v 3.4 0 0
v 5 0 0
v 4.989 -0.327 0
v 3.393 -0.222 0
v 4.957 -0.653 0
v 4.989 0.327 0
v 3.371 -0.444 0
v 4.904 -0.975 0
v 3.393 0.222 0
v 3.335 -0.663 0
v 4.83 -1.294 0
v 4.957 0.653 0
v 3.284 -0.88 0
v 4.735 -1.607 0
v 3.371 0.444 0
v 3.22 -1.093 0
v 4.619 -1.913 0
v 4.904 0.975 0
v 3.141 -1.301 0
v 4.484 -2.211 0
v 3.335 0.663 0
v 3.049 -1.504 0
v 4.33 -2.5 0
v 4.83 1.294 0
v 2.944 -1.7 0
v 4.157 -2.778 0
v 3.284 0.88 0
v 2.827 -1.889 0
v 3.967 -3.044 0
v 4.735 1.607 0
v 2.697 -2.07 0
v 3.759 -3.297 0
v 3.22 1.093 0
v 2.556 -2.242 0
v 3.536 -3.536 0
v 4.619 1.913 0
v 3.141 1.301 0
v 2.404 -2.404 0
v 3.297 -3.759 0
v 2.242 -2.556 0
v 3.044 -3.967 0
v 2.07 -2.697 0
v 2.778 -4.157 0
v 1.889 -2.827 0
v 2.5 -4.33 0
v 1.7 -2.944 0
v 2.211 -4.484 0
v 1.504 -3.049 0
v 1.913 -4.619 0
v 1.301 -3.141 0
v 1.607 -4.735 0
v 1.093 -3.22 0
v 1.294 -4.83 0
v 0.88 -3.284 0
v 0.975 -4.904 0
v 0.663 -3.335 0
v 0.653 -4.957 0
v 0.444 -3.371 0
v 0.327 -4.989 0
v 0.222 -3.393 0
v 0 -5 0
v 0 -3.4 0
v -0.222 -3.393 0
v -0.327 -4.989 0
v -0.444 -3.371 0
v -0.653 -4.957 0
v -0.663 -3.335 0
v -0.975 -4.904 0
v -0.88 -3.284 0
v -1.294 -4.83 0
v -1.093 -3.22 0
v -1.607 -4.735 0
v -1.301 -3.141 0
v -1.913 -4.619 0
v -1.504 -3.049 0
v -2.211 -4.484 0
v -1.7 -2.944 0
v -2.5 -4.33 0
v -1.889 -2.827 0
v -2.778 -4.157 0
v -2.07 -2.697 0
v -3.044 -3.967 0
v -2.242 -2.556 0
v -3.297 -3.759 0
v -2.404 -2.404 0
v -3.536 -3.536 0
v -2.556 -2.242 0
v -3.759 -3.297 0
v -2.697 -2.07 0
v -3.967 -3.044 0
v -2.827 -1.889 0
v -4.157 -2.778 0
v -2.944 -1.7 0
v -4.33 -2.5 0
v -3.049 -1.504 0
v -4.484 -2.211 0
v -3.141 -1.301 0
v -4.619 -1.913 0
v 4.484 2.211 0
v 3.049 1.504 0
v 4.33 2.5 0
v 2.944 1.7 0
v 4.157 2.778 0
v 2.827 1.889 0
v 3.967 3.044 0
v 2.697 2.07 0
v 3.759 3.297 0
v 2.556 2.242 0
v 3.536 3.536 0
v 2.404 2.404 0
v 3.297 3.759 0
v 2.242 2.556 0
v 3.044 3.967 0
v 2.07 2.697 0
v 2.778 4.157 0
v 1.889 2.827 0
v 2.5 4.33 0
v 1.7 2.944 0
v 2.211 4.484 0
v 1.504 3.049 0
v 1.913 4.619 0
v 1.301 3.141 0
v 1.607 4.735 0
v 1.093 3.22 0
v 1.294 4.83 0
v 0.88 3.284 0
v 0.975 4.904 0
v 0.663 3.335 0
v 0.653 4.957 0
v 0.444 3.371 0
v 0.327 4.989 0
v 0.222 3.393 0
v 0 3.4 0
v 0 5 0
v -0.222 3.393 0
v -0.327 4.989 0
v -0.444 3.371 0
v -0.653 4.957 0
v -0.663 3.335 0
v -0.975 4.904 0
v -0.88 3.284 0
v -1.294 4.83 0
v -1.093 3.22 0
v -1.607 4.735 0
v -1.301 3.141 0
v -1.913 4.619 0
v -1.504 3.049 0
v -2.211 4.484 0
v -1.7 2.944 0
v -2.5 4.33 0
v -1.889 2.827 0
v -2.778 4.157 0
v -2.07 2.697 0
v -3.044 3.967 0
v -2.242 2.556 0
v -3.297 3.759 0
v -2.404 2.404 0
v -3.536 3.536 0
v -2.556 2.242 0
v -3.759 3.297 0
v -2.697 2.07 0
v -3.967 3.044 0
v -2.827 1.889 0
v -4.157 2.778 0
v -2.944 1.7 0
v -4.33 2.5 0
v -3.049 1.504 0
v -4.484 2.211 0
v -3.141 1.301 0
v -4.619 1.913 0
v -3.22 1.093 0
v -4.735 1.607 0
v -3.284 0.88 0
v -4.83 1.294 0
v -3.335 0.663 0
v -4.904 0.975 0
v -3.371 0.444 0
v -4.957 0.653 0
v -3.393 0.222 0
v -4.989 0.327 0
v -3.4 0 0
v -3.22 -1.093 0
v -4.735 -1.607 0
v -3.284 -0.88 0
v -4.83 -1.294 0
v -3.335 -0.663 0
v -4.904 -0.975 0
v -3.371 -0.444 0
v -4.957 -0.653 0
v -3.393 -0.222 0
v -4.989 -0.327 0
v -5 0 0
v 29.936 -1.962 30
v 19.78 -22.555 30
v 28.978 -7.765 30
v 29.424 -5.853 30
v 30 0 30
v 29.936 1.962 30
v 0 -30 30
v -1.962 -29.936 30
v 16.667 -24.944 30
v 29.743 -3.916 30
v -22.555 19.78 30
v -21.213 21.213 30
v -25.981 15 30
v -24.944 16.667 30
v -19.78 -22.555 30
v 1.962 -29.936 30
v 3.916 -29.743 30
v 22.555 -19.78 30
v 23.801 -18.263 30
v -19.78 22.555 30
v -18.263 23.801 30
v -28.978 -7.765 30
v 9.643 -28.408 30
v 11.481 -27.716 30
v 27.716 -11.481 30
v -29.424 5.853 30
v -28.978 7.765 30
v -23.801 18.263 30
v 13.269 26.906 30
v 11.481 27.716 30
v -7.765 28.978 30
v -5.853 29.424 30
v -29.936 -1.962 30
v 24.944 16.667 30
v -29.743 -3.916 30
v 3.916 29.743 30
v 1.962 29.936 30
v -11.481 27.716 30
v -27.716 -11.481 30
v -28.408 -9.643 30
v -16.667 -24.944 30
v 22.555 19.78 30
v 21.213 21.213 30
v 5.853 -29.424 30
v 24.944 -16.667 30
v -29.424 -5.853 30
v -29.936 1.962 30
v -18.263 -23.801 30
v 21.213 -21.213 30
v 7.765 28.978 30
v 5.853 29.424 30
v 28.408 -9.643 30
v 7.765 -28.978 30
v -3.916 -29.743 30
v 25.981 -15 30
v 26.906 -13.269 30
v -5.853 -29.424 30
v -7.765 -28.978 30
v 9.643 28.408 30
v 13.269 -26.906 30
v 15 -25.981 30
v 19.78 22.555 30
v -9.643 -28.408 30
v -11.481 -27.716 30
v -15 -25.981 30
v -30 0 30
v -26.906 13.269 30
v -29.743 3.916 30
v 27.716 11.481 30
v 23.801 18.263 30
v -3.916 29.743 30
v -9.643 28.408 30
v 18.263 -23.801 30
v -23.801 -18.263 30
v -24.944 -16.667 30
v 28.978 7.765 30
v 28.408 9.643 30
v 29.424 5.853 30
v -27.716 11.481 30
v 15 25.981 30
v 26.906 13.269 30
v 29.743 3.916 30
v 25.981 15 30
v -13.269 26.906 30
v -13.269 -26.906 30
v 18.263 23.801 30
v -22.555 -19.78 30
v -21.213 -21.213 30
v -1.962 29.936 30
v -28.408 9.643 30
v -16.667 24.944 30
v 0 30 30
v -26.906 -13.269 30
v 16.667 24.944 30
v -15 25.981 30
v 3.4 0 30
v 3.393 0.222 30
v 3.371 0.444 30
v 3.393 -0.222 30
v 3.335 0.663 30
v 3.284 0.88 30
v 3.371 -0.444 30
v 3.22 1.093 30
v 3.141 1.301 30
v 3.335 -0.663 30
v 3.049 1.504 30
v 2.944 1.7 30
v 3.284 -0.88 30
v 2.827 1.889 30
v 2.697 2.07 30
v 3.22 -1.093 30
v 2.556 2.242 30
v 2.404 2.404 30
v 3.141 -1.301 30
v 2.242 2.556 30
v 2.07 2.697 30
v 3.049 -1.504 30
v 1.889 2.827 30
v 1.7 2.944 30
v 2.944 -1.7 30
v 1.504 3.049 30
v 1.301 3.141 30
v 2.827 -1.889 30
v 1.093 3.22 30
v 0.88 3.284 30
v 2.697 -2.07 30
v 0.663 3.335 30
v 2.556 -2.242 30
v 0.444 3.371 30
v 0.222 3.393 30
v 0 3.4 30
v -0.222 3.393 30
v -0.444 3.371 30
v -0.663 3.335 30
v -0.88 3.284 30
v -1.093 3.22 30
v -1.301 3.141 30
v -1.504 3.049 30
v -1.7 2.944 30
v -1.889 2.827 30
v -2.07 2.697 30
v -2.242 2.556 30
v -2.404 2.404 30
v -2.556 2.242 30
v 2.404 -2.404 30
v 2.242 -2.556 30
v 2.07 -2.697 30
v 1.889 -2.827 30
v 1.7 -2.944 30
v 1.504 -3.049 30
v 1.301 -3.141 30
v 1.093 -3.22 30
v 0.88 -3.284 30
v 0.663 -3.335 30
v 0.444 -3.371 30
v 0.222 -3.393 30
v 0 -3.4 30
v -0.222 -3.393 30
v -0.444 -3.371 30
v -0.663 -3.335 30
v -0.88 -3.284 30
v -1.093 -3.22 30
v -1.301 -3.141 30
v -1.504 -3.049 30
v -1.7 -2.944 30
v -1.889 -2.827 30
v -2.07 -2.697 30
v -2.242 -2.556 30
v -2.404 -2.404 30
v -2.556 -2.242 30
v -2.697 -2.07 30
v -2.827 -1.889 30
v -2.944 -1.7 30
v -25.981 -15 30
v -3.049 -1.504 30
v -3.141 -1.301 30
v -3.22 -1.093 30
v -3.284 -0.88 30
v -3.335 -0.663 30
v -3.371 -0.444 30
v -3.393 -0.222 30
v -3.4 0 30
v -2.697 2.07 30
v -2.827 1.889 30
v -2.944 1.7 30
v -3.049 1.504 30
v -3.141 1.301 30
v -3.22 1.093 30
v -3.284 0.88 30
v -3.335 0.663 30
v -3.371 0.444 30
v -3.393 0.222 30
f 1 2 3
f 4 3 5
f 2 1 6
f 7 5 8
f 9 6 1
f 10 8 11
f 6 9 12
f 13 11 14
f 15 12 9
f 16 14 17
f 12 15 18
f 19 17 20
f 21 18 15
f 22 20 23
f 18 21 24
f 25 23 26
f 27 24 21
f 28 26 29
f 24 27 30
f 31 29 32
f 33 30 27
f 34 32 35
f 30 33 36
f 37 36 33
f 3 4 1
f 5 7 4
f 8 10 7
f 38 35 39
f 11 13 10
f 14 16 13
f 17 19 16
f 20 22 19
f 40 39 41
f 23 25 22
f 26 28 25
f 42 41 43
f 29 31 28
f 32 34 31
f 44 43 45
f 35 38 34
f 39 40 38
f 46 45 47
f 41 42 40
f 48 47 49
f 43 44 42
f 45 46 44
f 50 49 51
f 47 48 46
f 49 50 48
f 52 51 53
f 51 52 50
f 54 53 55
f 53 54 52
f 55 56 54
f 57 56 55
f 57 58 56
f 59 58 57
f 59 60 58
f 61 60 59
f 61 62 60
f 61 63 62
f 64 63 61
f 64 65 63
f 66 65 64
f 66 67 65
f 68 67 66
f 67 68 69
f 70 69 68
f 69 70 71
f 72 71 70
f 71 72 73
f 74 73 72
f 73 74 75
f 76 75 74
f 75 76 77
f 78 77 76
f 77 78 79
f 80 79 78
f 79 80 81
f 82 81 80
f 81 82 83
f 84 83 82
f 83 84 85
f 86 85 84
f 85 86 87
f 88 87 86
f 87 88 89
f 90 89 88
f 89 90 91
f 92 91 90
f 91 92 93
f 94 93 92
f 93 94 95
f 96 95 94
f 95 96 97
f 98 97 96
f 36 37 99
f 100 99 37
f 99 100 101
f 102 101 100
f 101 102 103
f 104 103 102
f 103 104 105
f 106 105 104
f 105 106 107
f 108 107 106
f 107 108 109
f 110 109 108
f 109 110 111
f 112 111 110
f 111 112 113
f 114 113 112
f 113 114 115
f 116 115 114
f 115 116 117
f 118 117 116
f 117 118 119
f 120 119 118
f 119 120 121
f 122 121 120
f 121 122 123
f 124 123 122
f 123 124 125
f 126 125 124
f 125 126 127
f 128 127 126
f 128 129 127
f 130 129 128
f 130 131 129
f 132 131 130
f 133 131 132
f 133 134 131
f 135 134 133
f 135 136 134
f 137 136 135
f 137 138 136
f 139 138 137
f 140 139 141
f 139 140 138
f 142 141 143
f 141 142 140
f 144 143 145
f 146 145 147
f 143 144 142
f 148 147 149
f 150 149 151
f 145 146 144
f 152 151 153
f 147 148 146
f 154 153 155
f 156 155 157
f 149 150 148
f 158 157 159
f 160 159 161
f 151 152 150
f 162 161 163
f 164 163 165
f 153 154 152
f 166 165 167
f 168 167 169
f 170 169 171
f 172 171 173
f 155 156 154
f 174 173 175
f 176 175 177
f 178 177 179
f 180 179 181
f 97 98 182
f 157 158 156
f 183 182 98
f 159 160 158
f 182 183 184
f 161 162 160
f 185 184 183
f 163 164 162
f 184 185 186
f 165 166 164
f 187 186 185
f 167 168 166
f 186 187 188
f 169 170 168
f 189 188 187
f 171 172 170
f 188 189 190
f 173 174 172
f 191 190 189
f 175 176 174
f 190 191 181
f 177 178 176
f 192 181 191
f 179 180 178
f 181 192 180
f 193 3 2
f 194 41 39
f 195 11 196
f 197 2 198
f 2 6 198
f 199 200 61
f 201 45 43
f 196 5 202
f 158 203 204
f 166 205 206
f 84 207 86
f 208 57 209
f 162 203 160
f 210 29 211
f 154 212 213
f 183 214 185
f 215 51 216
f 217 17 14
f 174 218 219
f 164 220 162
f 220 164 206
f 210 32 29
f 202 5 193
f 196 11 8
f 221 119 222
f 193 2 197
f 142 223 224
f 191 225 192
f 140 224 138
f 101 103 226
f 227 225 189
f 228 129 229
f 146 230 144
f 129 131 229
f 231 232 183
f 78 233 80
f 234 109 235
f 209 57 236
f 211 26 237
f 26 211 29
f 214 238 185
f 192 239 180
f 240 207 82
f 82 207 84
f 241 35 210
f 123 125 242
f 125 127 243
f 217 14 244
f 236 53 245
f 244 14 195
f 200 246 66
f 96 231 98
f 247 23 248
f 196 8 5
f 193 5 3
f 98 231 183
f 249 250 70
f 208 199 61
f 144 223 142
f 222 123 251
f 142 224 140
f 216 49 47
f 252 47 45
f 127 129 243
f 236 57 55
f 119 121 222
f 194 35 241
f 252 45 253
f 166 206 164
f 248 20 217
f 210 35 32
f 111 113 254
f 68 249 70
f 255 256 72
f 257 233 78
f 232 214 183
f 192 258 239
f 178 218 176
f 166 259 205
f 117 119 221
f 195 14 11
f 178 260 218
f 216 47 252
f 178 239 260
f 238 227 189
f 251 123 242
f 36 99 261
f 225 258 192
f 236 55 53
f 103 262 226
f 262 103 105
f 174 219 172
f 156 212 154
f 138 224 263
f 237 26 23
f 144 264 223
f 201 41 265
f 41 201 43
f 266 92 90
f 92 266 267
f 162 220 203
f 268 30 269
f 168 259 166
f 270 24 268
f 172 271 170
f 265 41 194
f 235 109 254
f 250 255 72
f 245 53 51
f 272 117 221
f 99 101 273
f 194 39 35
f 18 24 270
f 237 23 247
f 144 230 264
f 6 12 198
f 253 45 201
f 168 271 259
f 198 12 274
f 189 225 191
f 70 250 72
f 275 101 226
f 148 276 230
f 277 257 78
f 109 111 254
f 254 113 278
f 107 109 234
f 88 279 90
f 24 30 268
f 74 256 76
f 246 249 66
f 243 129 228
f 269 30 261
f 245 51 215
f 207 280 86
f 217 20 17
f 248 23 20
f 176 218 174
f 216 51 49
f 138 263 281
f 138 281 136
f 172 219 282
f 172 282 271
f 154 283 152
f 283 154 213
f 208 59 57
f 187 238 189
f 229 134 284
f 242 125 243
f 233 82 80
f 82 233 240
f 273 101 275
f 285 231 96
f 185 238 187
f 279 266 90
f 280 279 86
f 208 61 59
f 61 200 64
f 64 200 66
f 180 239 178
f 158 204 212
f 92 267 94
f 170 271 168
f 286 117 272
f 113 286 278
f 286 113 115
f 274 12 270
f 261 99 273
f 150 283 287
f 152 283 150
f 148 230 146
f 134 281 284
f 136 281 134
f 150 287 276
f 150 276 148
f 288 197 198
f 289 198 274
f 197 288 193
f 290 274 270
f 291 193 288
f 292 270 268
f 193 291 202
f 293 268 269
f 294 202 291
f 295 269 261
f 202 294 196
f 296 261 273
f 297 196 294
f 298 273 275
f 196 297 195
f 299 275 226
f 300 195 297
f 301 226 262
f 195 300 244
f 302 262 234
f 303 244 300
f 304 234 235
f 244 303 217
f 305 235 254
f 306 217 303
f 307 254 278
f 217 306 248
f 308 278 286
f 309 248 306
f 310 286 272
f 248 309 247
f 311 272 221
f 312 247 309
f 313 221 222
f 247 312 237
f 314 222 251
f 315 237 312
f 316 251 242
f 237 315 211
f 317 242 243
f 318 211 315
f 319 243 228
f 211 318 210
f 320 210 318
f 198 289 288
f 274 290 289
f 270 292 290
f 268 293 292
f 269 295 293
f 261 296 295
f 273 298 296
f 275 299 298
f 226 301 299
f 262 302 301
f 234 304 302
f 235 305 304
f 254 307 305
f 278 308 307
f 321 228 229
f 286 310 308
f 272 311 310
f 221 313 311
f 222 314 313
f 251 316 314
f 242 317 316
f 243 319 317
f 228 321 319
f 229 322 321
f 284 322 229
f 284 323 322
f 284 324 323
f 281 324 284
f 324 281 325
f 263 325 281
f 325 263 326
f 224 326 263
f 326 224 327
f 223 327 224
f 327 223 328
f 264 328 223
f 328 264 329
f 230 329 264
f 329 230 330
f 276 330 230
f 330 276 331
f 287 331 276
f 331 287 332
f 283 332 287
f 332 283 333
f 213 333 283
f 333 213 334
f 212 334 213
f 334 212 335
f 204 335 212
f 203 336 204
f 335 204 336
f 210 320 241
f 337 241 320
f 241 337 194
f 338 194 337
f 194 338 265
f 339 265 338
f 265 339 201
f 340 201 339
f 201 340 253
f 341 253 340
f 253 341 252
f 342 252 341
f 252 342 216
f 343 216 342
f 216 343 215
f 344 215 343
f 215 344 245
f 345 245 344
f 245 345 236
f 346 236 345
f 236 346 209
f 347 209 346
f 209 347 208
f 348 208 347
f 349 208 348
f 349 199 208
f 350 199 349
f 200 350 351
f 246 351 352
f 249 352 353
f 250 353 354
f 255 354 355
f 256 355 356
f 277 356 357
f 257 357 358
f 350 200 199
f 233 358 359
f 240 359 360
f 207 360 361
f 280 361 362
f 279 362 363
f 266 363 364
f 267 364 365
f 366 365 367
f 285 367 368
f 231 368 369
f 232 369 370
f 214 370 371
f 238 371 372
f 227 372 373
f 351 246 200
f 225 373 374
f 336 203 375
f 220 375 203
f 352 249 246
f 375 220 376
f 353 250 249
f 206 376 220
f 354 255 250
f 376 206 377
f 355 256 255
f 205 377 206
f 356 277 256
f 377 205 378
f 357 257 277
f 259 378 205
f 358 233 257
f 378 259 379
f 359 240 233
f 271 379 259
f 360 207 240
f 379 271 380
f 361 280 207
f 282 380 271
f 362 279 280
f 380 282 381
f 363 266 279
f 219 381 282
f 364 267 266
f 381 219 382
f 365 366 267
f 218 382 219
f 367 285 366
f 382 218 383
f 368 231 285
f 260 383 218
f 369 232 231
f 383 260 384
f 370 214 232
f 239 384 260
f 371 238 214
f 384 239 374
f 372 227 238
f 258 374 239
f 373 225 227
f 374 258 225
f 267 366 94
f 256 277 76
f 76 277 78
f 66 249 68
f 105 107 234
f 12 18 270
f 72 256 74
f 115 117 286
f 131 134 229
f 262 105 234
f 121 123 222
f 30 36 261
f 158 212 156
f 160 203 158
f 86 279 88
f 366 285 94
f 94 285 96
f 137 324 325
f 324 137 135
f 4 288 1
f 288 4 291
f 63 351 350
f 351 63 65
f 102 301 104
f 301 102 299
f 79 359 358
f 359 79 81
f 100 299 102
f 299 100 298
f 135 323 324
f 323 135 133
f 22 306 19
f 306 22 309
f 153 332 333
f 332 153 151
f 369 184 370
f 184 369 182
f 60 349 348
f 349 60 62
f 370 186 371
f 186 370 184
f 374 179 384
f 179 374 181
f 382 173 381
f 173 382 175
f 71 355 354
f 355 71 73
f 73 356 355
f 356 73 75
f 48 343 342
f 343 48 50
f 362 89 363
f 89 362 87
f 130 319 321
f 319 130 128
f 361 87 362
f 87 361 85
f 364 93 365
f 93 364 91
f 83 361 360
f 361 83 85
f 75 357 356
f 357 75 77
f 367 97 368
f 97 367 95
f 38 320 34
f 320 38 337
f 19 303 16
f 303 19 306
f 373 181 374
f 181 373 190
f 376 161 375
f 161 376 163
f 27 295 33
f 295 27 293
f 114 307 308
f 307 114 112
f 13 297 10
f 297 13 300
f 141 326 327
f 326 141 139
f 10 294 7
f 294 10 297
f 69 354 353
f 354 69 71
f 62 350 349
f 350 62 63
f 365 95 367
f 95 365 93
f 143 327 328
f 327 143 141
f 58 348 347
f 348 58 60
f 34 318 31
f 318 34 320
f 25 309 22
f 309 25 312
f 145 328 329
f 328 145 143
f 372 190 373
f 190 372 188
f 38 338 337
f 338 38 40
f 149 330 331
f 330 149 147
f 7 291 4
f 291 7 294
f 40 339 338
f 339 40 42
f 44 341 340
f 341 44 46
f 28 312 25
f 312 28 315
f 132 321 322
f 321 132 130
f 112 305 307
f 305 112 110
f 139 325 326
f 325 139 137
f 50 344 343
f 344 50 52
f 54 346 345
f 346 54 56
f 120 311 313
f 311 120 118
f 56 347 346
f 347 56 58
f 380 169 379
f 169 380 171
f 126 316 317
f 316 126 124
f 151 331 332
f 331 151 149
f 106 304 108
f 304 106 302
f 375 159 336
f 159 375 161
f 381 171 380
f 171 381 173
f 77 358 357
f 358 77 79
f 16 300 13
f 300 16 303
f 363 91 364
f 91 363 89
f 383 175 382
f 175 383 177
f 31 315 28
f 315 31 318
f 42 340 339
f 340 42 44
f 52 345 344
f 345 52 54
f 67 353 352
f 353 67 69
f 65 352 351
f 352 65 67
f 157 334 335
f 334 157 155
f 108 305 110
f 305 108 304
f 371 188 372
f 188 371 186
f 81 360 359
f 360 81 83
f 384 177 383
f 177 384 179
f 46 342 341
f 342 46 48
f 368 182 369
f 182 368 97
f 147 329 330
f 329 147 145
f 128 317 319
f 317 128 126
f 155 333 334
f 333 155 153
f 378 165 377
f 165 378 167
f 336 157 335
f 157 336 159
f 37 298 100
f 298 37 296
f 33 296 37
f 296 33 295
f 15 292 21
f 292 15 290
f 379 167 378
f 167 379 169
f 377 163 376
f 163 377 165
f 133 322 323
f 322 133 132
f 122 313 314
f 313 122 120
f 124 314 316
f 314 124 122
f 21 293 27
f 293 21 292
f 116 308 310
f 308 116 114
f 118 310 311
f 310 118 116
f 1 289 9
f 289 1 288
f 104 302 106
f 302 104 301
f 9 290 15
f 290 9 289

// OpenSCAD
// Lab funnel - printed upright, open at top and bottom
// Spout: 10 mm outer diameter, z = 0 to 20
// Cone: widens from 10 mm (z = 20) to 60 mm (z = 50)
// Wall thickness: 1.6 mm everywhere

// ---------- Parameters ----------
spout_d        = 10;     // spout outer diameter
spout_bore     = spout_d - 2 * 1.6;  // spout bore (6.8 mm)
spout_h        = 20;     // spout height
cone_top_d     = 60;     // cone rim outer diameter
cone_bottom_d  = spout_d;  // cone base outer diameter (matches spout)
cone_h         = 50 - spout_h;  // cone height (30 mm)
wall           = 1.6;    // wall thickness
eps            = 0.5;    // cutter overshoot past faces

$fn = 96;

// ---------- Model ----------
difference() {
    union() {
        // Spout (tube)
        cylinder(d = spout_d, h = spout_h);
        // Cone
        cylinder(d1 = cone_bottom_d, d2 = cone_top_d, h = cone_h);
    }
    // Through-bore: spout bore up to z = 20, then expanding bore through cone
    translate([0, 0, -eps])
        linear_extrude(height = spout_h + cone_h + 2 * eps)
            circle(d = spout_bore);
}
